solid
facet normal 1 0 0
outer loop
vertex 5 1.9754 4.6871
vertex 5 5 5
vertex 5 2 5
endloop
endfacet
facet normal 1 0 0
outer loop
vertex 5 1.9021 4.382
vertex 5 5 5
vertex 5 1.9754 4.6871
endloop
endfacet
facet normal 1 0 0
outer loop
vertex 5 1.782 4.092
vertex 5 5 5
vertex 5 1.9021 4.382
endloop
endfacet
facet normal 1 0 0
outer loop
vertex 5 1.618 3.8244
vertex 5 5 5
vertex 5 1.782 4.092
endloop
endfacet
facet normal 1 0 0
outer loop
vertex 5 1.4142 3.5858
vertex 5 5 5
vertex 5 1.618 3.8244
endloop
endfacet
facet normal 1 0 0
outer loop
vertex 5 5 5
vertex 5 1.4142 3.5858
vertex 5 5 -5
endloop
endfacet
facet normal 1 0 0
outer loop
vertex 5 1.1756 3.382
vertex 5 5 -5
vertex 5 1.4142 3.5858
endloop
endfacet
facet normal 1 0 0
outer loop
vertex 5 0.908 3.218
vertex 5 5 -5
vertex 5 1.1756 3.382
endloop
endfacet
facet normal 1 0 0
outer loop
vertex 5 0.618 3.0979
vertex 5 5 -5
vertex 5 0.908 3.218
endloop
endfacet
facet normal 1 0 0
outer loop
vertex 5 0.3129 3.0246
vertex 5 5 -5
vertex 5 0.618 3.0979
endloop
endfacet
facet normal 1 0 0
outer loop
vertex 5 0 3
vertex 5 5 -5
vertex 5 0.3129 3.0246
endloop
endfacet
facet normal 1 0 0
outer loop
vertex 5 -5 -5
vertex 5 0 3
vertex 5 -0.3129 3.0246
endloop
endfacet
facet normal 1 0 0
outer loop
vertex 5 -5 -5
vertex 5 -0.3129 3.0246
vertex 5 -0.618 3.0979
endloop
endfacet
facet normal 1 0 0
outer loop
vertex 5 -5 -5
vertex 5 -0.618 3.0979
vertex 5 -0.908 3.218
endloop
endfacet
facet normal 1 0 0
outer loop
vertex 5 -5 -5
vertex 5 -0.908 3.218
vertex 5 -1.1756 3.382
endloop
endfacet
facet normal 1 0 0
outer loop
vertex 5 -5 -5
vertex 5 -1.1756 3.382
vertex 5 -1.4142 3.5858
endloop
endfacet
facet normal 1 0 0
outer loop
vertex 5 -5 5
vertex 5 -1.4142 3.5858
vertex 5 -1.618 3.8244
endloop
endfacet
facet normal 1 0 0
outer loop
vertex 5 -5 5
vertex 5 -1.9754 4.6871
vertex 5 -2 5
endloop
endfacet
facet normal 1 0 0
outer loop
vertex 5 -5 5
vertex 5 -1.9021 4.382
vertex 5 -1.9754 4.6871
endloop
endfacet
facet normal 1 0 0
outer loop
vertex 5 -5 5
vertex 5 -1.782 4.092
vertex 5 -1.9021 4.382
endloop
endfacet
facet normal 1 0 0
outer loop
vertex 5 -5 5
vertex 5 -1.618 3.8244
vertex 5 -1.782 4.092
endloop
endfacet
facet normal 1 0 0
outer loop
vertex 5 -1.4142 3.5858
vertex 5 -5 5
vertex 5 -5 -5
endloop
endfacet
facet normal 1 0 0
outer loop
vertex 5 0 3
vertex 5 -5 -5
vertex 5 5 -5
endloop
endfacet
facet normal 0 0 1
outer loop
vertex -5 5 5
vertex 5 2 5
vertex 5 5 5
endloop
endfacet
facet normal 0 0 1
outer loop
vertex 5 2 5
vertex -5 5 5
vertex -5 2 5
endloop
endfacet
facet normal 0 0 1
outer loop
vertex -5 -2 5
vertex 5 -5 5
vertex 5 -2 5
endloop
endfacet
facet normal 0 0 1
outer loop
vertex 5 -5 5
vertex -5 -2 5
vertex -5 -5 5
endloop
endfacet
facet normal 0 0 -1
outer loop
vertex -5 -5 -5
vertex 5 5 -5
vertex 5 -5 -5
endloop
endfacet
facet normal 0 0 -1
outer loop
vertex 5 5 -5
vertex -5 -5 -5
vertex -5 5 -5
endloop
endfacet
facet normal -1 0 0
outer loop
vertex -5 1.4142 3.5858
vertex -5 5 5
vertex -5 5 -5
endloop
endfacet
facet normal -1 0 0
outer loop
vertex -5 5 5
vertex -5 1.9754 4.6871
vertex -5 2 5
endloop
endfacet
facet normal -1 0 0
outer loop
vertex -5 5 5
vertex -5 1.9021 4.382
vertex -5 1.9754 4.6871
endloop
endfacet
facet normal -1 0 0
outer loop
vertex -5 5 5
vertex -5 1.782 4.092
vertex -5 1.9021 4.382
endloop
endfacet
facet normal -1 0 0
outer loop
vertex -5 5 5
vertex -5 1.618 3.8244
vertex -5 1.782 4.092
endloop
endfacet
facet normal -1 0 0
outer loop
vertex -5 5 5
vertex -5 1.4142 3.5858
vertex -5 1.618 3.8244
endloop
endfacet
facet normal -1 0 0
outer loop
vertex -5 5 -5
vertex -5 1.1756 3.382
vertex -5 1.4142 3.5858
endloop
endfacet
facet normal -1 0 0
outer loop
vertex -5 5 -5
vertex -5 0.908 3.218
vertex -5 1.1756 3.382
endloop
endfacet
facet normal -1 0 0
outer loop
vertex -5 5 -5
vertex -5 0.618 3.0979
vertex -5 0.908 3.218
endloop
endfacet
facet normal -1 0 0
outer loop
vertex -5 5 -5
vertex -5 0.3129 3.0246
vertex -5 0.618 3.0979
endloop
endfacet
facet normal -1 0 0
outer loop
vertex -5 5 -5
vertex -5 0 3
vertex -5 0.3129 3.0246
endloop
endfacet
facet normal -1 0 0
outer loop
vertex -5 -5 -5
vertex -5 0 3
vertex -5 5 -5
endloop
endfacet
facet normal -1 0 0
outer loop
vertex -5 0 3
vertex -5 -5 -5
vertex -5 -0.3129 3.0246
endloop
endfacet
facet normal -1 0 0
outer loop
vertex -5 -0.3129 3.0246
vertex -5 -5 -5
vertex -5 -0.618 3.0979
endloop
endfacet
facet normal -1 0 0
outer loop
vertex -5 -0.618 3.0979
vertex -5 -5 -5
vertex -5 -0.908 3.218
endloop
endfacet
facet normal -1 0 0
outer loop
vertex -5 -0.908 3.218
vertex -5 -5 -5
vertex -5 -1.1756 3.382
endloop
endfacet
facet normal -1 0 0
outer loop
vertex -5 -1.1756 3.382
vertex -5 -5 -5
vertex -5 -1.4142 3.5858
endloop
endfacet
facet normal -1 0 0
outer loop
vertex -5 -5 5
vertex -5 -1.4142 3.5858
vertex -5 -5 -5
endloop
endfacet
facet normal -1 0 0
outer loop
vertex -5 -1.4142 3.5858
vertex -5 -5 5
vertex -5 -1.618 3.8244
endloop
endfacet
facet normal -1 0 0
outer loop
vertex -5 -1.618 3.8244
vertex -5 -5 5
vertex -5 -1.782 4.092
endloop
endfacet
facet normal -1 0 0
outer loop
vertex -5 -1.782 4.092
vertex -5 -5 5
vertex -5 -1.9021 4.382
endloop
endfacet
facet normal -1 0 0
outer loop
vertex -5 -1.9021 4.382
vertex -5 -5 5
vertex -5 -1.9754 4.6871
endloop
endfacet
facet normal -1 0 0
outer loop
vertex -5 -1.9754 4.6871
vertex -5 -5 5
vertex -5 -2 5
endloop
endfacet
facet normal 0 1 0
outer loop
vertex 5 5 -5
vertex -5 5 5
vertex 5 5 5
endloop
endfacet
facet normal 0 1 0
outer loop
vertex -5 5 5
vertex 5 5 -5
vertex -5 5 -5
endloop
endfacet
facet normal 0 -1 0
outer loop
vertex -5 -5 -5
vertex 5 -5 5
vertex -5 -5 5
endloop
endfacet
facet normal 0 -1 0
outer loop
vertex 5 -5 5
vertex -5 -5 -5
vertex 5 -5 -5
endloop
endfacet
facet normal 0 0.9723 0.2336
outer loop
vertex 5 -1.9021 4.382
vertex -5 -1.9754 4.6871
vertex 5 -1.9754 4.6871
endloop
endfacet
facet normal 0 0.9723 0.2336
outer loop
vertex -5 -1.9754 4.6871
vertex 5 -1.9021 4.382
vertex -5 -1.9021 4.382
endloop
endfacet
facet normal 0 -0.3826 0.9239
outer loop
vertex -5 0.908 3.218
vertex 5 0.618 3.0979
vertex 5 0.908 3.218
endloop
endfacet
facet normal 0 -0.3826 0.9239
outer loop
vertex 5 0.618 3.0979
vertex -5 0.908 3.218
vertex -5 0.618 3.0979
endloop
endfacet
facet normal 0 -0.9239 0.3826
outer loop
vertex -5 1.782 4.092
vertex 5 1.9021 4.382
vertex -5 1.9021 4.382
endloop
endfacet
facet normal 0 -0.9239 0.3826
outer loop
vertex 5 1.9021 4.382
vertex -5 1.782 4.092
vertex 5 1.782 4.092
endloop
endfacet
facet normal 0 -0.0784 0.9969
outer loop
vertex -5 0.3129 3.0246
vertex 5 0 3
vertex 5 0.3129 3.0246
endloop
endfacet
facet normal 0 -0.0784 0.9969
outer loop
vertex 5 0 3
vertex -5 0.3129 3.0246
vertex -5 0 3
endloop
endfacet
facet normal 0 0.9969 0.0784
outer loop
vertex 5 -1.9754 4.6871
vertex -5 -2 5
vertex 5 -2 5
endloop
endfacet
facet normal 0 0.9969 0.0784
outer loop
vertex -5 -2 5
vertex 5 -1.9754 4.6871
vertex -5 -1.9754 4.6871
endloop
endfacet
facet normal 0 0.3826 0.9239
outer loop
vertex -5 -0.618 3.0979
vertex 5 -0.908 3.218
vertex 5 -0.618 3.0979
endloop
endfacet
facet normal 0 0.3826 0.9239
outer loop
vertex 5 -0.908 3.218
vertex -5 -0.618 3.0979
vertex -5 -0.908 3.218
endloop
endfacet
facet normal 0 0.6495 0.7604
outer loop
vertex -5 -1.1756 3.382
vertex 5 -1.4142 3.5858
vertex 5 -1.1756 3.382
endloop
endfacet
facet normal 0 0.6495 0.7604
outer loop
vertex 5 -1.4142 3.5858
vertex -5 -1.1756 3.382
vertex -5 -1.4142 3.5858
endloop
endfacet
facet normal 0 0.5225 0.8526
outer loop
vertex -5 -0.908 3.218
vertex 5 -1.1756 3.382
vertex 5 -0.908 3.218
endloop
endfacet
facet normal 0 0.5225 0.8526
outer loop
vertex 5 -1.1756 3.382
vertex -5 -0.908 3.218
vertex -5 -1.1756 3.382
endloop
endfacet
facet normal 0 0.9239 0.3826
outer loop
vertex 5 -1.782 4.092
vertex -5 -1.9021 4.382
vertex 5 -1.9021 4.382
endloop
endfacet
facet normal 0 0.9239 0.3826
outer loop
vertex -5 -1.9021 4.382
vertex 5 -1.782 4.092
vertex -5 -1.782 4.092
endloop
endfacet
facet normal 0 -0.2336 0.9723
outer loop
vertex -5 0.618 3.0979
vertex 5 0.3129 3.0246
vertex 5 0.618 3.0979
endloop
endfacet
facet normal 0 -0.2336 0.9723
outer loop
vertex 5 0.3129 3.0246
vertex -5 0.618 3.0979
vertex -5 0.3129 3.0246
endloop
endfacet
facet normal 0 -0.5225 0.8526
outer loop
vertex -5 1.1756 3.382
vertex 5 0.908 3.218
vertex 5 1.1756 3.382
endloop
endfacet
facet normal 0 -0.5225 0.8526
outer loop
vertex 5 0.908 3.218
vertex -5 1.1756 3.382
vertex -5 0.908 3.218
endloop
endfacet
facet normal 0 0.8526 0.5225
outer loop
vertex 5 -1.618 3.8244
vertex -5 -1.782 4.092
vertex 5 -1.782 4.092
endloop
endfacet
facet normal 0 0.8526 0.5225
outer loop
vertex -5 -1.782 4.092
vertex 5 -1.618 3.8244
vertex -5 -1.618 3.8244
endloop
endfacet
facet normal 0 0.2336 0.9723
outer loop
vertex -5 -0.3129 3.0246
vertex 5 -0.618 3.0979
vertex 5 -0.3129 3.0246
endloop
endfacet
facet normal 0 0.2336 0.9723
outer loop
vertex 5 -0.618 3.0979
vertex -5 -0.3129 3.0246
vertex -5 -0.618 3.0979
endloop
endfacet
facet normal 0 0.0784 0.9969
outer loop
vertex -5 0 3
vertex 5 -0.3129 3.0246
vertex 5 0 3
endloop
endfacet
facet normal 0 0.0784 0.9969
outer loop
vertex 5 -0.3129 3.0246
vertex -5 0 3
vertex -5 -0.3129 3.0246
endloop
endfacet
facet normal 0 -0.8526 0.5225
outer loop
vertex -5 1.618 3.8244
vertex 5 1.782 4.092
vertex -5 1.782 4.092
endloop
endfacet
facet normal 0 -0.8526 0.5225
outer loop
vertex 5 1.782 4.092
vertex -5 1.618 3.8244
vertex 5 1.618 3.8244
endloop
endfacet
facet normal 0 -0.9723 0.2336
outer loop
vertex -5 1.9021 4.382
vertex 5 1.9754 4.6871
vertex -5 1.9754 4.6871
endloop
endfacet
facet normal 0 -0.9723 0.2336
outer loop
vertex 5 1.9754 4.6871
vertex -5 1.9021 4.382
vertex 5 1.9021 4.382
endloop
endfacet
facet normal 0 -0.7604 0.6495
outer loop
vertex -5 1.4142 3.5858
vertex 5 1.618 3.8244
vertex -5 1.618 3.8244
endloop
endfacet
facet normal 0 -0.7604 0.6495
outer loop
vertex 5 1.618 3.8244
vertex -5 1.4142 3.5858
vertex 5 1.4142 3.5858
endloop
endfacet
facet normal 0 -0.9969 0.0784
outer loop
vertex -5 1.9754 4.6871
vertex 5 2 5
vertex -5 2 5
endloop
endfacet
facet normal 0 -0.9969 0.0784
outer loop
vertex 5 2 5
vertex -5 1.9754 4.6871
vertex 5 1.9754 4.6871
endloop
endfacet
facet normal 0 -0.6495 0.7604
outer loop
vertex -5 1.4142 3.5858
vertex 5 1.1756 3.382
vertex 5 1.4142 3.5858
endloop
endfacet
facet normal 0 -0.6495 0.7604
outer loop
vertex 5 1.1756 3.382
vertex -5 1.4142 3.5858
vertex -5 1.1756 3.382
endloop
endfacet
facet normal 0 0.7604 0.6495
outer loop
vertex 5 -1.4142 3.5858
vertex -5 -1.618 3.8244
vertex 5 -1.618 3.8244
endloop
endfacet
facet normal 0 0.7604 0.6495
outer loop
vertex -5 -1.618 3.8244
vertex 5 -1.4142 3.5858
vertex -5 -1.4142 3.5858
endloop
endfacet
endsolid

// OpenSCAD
// Unit of length: Unit.MM
difference()
{
   cube(size = 10.0, center = true);
   translate(v = [0.0, 0.0, 5.0])
   {
      union()
      {
         rotate(a = [0.0, 90.0, 0.0])
         {
            cylinder(h = 20.0, d = 4.0, center = true, $fn = 40);
         }
         *union()
         {
            rotate(a = [90.0, 0.0, 0.0])
            {
               #union()
               {
                  cylinder(h = 20.0, d = 4.0, center = true, $fn = 40);
               }
            }
         }
      }
   }
}
